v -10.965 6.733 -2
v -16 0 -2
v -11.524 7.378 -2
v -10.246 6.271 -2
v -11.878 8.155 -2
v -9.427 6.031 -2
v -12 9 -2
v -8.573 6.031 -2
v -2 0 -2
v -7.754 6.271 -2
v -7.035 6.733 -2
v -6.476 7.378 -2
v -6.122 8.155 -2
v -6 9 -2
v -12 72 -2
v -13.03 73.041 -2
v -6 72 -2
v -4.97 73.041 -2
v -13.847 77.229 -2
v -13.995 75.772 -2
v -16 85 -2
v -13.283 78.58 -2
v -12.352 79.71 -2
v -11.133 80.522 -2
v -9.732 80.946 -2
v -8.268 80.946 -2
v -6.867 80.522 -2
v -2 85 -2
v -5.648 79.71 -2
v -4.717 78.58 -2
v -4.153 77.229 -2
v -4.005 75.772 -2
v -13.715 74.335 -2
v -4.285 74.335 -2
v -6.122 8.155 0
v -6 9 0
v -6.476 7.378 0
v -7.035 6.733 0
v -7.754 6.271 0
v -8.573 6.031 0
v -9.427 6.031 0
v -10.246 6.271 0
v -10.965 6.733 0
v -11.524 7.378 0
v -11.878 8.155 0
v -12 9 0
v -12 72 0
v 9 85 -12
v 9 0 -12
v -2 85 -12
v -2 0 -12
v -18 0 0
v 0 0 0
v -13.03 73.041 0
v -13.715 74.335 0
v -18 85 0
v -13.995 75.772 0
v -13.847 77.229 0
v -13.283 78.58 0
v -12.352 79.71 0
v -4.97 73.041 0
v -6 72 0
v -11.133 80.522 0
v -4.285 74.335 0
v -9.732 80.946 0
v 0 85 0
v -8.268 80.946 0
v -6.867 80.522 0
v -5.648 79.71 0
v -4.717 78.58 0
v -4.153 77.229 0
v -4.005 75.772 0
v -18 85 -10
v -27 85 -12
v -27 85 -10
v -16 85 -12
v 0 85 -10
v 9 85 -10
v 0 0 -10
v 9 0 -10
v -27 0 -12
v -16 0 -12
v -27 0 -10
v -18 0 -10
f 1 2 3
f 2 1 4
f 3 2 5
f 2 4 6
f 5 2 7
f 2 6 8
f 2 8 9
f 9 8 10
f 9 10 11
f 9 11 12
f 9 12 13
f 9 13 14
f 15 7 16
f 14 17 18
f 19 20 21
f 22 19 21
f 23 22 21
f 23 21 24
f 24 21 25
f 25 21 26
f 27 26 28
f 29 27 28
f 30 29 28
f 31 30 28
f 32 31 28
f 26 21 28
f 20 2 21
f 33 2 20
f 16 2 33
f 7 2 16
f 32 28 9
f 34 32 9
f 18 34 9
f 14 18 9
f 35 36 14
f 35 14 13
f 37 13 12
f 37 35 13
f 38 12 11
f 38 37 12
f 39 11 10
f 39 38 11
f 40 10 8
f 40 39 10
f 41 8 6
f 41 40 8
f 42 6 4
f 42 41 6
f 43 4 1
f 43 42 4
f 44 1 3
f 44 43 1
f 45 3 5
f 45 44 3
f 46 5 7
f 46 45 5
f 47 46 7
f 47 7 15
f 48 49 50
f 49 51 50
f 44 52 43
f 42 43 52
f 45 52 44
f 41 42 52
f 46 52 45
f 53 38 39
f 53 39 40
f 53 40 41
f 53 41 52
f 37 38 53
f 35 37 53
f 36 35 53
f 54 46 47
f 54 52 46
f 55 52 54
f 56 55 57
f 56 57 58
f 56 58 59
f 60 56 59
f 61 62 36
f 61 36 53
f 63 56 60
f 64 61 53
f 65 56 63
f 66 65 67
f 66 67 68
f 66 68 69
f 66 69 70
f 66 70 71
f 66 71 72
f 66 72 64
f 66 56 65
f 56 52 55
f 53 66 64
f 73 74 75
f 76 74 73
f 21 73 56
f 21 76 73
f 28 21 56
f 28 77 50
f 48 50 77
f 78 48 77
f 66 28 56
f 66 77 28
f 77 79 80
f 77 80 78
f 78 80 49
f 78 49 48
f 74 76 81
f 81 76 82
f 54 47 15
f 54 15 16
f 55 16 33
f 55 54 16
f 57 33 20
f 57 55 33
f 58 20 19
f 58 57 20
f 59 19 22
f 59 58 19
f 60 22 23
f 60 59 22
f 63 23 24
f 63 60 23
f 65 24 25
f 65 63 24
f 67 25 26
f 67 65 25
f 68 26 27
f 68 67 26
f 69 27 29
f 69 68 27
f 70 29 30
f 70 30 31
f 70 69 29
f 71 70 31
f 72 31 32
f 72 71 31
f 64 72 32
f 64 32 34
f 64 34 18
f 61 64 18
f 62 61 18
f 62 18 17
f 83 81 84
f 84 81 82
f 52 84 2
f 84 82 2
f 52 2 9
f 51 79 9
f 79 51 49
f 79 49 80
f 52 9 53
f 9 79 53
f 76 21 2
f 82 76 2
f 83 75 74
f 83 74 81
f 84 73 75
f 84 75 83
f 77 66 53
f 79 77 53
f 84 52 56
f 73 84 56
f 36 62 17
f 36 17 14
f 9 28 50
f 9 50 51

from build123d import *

# Parameters (mm, degrees)
F0_W     = 18
F0_H     = 85
F1_DEPTH = 2
F2_W     = 2
F2_H     = 85
F3_DEPTH = 10
F4_W     = 85
F4_H     = 2
F5_DEPTH = 9
F6_W     = 85
F6_H     = 2
F7_DEPTH = 9


with BuildPart() as f1:
    # F0 (on Top) → F1 (new body)
    with BuildSketch(Plane.XY):
        with Locations((-9, 42.5)):
            Rectangle(F0_W, F0_H)
        with BuildLine():
            ThreePointArc((-12, 72), (-9, 81), (-6, 72))
            Line((-6, 72), (-6, 9))
            ThreePointArc((-6, 9), (-9, 6), (-12, 9))
            Line((-12, 9), (-12, 72))
        make_face(mode=Mode.SUBTRACT)
    extrude(amount=-F1_DEPTH)

    # F2 (on face) → F3 (join)
    with BuildSketch(Plane(origin=(0, 0, -2), x_dir=(1, 0, 0), z_dir=(0, 0, -1))):
        with Locations((-1, -42.5)):
            Rectangle(F2_W, F2_H)
        with Locations((-17, -42.5)):
            Rectangle(F2_W, F2_H)
    extrude(amount=F3_DEPTH)

    # F4 (on face) → F5 (join)
    with BuildSketch(Plane.YZ):
        with Locations((42.5, -11)):
            Rectangle(F4_W, F4_H)
    extrude(amount=F5_DEPTH)

    # F6 (on face) → F7 (join)
    with BuildSketch(Plane(origin=(-18, 0, 0), x_dir=(0, -1, 0), z_dir=(-1, 0, 0))):
        with Locations((-42.5, -11)):
            Rectangle(F6_W, F6_H)
    extrude(amount=F7_DEPTH)


solid = f1.part
